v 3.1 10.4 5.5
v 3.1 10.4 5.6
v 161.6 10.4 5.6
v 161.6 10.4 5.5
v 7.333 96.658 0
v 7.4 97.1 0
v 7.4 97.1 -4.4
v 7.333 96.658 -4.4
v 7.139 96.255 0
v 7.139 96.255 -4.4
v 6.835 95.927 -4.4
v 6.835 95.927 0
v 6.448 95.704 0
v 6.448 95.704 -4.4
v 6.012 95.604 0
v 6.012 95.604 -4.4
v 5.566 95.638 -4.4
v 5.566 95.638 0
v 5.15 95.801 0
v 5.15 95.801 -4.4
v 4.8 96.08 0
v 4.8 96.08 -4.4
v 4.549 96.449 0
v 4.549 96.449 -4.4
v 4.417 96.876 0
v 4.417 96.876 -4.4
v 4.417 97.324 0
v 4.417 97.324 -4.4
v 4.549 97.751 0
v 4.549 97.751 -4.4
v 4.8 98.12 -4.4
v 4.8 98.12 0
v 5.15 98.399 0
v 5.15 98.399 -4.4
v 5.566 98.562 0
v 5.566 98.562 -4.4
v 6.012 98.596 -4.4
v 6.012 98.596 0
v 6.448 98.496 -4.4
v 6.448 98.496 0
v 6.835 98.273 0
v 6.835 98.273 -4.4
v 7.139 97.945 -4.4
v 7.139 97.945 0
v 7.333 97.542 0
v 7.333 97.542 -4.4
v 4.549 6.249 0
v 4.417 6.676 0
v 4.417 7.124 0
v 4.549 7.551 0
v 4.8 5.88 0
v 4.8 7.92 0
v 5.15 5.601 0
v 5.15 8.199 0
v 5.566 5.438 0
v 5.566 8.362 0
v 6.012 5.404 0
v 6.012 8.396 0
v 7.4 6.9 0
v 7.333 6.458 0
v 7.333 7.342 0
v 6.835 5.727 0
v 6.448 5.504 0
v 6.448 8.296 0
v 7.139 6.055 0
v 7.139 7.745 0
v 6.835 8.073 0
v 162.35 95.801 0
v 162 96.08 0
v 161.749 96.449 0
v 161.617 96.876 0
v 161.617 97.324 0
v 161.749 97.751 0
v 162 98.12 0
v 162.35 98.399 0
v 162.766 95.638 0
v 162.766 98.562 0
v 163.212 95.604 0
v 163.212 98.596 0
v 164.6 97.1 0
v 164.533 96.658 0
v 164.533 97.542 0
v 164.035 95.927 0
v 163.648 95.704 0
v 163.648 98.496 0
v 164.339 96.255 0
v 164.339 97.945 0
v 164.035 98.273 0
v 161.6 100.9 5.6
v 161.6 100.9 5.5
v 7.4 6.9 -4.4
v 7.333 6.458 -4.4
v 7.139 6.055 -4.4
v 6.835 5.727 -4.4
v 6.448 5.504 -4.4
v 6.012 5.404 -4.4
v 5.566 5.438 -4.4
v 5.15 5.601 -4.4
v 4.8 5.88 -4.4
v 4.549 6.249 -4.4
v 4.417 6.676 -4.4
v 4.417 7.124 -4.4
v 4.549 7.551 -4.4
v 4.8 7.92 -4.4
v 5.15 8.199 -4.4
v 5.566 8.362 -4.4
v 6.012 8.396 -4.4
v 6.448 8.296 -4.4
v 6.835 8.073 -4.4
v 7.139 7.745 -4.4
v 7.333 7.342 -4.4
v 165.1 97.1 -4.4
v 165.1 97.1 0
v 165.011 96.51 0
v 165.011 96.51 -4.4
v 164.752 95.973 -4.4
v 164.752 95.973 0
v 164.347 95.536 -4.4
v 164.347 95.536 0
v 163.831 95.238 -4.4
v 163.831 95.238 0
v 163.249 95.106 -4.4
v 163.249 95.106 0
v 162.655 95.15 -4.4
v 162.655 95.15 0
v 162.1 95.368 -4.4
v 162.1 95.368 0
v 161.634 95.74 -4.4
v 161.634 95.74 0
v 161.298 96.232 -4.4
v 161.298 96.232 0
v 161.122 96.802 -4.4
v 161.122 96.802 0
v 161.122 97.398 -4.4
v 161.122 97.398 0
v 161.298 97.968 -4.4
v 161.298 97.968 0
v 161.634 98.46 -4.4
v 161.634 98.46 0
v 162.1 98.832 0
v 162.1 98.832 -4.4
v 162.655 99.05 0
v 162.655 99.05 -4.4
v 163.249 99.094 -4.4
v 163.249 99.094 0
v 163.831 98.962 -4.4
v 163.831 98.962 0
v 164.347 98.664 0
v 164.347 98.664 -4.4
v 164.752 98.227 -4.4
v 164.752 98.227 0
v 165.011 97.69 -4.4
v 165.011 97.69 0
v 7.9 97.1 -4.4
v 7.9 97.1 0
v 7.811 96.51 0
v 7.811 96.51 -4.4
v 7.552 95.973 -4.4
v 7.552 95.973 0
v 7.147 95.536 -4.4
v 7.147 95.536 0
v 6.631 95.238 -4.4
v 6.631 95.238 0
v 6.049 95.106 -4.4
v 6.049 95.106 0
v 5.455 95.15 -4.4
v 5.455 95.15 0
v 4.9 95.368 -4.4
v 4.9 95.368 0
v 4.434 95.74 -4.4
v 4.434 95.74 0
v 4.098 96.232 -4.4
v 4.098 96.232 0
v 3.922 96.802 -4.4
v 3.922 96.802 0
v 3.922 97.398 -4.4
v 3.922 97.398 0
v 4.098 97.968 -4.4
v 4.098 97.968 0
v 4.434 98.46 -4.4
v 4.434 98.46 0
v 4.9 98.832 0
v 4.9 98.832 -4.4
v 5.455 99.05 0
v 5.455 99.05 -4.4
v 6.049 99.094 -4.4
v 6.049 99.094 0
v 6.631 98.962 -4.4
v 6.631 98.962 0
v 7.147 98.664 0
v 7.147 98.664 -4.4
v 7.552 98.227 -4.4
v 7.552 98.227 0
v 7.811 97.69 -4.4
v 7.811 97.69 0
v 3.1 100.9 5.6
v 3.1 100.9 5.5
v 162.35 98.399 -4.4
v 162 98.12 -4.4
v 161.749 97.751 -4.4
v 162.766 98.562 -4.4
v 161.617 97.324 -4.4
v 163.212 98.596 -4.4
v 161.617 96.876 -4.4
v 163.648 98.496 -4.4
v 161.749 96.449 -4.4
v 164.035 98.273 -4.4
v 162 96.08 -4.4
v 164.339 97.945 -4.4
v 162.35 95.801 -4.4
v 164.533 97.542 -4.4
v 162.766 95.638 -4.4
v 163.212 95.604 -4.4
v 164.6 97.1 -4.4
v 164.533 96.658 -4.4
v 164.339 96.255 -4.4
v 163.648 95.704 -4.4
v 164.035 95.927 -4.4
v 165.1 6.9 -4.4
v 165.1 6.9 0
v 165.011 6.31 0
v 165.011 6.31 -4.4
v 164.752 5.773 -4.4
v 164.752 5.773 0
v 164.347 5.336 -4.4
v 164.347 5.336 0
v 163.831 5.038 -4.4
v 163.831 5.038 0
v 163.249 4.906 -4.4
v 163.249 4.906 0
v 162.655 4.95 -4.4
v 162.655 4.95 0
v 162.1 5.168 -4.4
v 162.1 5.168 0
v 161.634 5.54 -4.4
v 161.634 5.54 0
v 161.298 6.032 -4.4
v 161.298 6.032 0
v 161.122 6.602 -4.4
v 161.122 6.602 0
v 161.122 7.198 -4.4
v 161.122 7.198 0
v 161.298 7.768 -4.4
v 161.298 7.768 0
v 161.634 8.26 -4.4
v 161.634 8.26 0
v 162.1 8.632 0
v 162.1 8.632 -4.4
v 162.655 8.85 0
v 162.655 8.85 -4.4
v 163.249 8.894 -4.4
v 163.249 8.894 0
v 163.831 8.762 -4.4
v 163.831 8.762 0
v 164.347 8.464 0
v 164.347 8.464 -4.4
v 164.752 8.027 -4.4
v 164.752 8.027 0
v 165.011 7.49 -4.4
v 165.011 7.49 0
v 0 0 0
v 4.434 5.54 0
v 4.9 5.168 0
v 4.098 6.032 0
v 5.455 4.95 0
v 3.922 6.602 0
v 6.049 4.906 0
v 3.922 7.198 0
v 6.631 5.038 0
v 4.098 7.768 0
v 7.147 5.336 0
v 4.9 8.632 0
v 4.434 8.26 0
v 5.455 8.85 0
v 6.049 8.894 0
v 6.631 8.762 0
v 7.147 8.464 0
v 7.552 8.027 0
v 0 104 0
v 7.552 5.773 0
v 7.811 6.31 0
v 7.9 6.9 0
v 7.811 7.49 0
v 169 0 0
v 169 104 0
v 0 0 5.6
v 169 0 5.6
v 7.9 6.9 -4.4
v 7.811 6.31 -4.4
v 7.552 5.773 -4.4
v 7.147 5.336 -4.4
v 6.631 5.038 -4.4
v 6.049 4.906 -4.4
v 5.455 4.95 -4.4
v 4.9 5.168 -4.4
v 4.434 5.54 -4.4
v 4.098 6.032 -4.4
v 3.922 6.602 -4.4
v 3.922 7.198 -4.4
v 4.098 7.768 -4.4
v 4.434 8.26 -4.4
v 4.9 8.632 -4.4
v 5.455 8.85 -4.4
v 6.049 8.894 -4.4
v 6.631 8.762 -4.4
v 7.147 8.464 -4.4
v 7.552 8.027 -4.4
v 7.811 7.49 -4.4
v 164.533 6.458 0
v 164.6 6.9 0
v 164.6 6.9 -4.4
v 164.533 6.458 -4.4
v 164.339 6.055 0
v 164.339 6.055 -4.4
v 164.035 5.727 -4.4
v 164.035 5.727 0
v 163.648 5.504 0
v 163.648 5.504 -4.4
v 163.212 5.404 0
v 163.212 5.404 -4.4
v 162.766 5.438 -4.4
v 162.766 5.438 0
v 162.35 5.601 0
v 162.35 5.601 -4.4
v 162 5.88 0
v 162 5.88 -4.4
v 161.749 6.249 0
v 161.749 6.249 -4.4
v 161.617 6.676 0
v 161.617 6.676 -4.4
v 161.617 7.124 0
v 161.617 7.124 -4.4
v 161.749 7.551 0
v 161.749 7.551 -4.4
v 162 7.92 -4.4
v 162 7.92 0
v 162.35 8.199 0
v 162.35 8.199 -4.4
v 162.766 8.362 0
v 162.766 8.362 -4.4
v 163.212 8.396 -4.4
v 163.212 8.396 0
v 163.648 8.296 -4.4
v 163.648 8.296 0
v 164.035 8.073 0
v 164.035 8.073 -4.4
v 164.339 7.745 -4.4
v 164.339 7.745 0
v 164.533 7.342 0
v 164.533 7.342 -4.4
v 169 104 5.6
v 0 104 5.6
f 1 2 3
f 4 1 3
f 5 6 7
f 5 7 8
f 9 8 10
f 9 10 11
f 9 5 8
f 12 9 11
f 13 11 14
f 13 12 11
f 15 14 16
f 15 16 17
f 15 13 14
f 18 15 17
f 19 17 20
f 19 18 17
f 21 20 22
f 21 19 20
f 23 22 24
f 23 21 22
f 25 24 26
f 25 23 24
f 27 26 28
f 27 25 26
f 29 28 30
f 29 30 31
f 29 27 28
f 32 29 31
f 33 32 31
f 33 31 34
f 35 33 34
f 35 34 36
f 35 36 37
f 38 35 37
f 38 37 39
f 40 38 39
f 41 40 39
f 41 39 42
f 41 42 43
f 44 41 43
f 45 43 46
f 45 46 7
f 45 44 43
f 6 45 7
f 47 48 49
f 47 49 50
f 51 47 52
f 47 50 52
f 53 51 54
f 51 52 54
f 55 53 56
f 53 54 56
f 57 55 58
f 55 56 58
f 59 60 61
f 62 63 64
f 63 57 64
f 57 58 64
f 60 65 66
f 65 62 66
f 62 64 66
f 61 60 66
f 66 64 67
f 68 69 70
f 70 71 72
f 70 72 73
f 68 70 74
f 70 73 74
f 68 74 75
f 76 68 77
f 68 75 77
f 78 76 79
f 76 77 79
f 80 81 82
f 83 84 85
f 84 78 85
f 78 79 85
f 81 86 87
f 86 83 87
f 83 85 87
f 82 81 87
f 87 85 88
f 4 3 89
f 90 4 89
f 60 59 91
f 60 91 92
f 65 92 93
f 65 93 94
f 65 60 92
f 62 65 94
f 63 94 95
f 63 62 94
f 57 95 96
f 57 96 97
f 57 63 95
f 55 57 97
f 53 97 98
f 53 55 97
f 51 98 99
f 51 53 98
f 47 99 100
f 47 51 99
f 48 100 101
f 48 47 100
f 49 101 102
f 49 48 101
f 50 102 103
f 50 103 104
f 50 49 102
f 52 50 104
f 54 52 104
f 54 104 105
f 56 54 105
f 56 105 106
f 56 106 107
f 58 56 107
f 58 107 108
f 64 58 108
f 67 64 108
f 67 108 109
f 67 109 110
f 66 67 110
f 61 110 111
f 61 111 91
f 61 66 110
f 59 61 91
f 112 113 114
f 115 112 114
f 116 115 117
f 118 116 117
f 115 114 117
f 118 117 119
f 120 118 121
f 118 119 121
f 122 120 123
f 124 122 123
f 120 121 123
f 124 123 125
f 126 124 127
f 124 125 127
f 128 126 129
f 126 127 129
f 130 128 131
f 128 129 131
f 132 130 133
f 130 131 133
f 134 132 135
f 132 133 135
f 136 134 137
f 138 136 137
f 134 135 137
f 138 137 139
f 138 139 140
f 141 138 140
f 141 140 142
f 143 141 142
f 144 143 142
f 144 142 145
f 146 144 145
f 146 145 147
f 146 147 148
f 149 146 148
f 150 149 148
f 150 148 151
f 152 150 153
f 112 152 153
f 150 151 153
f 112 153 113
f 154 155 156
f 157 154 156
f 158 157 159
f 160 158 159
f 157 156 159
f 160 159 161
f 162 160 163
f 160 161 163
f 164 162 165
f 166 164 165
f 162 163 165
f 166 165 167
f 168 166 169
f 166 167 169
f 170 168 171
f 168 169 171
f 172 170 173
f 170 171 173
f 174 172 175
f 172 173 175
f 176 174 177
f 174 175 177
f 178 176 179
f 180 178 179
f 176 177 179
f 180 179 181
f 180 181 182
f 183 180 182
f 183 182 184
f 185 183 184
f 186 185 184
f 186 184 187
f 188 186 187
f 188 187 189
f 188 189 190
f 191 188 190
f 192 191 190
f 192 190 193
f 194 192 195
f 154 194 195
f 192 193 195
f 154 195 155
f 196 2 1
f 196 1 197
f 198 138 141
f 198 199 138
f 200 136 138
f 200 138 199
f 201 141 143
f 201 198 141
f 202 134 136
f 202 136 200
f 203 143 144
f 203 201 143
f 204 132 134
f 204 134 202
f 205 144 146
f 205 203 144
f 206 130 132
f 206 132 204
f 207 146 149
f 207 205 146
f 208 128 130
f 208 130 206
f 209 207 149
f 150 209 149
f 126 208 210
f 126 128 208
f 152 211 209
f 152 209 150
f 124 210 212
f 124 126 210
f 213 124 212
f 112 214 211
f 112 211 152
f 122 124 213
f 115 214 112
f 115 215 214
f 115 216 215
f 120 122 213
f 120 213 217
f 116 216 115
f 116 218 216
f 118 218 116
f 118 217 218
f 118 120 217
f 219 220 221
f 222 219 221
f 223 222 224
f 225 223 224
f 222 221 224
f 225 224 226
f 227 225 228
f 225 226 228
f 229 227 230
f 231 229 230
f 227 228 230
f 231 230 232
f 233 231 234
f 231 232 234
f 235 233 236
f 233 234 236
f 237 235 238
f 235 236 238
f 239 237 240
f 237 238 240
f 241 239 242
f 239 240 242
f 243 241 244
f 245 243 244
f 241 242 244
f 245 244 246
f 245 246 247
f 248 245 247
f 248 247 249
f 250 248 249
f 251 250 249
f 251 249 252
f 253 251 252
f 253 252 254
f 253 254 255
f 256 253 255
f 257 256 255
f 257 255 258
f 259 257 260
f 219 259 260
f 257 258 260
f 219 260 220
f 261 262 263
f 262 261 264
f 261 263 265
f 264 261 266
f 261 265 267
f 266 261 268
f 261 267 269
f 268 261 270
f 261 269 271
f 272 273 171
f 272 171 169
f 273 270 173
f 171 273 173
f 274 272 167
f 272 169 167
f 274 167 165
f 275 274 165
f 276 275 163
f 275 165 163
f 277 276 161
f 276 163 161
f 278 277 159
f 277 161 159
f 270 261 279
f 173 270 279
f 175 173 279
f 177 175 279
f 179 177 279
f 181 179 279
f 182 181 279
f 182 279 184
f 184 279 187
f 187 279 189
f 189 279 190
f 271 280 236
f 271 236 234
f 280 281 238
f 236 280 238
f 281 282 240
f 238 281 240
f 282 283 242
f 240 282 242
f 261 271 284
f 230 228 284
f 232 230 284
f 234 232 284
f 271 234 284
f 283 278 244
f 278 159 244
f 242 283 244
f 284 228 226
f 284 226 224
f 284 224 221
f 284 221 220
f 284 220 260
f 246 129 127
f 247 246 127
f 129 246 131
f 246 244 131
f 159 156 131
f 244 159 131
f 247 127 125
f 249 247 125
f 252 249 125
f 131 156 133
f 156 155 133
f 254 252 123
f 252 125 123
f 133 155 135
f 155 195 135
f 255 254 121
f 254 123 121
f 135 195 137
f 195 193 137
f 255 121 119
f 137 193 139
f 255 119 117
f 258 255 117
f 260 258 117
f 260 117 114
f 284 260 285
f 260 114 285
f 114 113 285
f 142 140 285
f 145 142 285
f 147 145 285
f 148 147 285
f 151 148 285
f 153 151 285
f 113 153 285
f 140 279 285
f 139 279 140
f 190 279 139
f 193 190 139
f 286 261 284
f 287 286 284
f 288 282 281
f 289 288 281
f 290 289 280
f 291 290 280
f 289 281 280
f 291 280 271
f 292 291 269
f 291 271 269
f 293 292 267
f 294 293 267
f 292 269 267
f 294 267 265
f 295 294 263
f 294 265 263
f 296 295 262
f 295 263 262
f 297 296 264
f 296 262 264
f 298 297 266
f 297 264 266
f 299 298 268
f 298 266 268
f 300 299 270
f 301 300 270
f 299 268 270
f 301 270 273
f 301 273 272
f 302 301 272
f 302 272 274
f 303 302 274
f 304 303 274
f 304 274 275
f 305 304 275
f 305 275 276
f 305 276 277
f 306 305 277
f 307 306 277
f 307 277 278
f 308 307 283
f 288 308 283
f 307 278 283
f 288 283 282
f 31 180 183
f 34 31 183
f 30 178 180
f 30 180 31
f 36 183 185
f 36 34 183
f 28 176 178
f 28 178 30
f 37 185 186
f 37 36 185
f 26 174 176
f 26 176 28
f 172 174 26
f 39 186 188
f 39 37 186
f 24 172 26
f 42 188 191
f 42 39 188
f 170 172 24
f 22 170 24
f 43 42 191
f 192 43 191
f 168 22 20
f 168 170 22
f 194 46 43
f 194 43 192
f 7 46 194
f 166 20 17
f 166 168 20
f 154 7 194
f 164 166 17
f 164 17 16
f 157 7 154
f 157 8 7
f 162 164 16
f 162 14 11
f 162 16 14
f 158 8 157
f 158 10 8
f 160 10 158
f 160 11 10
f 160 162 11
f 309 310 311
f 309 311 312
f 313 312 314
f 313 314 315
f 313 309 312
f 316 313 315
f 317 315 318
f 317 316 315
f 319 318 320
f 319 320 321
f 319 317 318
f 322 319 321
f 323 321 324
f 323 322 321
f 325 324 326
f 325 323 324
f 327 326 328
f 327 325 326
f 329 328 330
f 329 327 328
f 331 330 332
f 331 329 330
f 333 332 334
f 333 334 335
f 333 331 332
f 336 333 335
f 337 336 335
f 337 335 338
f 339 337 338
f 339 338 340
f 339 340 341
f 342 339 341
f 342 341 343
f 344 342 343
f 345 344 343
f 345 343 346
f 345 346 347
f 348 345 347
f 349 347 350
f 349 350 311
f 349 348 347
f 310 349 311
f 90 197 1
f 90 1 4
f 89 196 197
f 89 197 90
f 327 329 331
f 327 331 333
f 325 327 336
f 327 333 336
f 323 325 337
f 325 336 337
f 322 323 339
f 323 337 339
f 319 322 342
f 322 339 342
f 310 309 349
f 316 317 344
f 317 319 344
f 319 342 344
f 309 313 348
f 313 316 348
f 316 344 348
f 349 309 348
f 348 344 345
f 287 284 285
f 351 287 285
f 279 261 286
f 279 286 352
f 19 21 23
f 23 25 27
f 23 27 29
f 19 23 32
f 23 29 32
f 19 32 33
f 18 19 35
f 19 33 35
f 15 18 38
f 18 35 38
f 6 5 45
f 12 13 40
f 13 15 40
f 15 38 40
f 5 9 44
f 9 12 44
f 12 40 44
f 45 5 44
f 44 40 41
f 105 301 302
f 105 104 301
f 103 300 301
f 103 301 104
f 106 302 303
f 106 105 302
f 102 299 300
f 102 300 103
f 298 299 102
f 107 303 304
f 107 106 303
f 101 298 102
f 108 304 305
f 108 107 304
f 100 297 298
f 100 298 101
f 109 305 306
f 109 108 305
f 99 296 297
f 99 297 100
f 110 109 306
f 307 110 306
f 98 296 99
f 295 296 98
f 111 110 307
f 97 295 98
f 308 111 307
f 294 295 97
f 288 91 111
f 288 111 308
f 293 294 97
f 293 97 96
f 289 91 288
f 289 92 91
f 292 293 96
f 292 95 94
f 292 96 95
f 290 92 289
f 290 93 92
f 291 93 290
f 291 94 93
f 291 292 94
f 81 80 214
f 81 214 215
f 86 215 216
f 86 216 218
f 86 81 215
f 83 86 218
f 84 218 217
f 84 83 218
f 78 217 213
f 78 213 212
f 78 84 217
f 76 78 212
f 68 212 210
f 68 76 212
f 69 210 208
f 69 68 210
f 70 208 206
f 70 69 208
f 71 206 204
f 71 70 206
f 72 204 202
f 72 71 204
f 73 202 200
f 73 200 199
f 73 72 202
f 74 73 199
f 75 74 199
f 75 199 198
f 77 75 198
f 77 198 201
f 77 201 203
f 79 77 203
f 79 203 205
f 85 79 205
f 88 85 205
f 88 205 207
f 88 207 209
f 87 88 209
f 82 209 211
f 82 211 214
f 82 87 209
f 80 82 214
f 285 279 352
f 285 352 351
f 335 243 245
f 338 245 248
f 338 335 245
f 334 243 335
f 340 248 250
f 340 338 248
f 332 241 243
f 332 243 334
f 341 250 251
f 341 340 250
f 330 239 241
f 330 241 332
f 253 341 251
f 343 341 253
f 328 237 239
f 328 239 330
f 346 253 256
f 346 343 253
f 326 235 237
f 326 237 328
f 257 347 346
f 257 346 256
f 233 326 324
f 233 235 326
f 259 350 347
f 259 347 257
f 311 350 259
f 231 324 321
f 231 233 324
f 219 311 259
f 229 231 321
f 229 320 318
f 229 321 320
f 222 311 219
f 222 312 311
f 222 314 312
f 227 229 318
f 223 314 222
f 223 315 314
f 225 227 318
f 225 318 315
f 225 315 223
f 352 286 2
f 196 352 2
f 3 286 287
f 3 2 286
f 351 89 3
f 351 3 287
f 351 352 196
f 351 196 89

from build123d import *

# Parameters (mm, degrees)
F0_W     = 169
F0_H     = 104
F1_DEPTH = 5.6
F2_W     = 158.5
F2_H     = 90.5
F3_DEPTH = 0.1
F4_R     = 2
F4_R_2   = 1.5
F5_DEPTH = 4.4


with BuildPart() as f1:
    # F0 (on Top) → F1 (new body)
    with BuildSketch(Plane.XY):
        with Locations((84.5, 52)):
            Rectangle(F0_W, F0_H)
    extrude(amount=F1_DEPTH)

    # F2 (on face) → F3 (cut)
    with BuildSketch(Plane.XY.offset(5.6)):
        with Locations((82.35, 55.65)):
            Rectangle(F2_W, F2_H)
    extrude(amount=-F3_DEPTH, mode=Mode.SUBTRACT)

    # F4 (on face) → F5 (join)
    with BuildSketch(Plane(origin=(0, 0, 0), x_dir=(1, 0, 0), z_dir=(0, 0, -1))):
        with Locations((163.1, -97.1)):
            Circle(F4_R)
        with Locations((163.1, -97.1)):
            Circle(F4_R_2, mode=Mode.SUBTRACT)
        with Locations((5.9, -97.1)):
            Circle(F4_R)
        with Locations((5.9, -97.1)):
            Circle(F4_R_2, mode=Mode.SUBTRACT)
        with Locations((5.9, -6.9)):
            Circle(F4_R)
        with Locations((5.9, -6.9)):
            Circle(F4_R_2, mode=Mode.SUBTRACT)
        with Locations((163.1, -6.9)):
            Circle(F4_R)
        with Locations((163.1, -6.9)):
            Circle(F4_R_2, mode=Mode.SUBTRACT)
    extrude(amount=F5_DEPTH)


solid = f1.part
